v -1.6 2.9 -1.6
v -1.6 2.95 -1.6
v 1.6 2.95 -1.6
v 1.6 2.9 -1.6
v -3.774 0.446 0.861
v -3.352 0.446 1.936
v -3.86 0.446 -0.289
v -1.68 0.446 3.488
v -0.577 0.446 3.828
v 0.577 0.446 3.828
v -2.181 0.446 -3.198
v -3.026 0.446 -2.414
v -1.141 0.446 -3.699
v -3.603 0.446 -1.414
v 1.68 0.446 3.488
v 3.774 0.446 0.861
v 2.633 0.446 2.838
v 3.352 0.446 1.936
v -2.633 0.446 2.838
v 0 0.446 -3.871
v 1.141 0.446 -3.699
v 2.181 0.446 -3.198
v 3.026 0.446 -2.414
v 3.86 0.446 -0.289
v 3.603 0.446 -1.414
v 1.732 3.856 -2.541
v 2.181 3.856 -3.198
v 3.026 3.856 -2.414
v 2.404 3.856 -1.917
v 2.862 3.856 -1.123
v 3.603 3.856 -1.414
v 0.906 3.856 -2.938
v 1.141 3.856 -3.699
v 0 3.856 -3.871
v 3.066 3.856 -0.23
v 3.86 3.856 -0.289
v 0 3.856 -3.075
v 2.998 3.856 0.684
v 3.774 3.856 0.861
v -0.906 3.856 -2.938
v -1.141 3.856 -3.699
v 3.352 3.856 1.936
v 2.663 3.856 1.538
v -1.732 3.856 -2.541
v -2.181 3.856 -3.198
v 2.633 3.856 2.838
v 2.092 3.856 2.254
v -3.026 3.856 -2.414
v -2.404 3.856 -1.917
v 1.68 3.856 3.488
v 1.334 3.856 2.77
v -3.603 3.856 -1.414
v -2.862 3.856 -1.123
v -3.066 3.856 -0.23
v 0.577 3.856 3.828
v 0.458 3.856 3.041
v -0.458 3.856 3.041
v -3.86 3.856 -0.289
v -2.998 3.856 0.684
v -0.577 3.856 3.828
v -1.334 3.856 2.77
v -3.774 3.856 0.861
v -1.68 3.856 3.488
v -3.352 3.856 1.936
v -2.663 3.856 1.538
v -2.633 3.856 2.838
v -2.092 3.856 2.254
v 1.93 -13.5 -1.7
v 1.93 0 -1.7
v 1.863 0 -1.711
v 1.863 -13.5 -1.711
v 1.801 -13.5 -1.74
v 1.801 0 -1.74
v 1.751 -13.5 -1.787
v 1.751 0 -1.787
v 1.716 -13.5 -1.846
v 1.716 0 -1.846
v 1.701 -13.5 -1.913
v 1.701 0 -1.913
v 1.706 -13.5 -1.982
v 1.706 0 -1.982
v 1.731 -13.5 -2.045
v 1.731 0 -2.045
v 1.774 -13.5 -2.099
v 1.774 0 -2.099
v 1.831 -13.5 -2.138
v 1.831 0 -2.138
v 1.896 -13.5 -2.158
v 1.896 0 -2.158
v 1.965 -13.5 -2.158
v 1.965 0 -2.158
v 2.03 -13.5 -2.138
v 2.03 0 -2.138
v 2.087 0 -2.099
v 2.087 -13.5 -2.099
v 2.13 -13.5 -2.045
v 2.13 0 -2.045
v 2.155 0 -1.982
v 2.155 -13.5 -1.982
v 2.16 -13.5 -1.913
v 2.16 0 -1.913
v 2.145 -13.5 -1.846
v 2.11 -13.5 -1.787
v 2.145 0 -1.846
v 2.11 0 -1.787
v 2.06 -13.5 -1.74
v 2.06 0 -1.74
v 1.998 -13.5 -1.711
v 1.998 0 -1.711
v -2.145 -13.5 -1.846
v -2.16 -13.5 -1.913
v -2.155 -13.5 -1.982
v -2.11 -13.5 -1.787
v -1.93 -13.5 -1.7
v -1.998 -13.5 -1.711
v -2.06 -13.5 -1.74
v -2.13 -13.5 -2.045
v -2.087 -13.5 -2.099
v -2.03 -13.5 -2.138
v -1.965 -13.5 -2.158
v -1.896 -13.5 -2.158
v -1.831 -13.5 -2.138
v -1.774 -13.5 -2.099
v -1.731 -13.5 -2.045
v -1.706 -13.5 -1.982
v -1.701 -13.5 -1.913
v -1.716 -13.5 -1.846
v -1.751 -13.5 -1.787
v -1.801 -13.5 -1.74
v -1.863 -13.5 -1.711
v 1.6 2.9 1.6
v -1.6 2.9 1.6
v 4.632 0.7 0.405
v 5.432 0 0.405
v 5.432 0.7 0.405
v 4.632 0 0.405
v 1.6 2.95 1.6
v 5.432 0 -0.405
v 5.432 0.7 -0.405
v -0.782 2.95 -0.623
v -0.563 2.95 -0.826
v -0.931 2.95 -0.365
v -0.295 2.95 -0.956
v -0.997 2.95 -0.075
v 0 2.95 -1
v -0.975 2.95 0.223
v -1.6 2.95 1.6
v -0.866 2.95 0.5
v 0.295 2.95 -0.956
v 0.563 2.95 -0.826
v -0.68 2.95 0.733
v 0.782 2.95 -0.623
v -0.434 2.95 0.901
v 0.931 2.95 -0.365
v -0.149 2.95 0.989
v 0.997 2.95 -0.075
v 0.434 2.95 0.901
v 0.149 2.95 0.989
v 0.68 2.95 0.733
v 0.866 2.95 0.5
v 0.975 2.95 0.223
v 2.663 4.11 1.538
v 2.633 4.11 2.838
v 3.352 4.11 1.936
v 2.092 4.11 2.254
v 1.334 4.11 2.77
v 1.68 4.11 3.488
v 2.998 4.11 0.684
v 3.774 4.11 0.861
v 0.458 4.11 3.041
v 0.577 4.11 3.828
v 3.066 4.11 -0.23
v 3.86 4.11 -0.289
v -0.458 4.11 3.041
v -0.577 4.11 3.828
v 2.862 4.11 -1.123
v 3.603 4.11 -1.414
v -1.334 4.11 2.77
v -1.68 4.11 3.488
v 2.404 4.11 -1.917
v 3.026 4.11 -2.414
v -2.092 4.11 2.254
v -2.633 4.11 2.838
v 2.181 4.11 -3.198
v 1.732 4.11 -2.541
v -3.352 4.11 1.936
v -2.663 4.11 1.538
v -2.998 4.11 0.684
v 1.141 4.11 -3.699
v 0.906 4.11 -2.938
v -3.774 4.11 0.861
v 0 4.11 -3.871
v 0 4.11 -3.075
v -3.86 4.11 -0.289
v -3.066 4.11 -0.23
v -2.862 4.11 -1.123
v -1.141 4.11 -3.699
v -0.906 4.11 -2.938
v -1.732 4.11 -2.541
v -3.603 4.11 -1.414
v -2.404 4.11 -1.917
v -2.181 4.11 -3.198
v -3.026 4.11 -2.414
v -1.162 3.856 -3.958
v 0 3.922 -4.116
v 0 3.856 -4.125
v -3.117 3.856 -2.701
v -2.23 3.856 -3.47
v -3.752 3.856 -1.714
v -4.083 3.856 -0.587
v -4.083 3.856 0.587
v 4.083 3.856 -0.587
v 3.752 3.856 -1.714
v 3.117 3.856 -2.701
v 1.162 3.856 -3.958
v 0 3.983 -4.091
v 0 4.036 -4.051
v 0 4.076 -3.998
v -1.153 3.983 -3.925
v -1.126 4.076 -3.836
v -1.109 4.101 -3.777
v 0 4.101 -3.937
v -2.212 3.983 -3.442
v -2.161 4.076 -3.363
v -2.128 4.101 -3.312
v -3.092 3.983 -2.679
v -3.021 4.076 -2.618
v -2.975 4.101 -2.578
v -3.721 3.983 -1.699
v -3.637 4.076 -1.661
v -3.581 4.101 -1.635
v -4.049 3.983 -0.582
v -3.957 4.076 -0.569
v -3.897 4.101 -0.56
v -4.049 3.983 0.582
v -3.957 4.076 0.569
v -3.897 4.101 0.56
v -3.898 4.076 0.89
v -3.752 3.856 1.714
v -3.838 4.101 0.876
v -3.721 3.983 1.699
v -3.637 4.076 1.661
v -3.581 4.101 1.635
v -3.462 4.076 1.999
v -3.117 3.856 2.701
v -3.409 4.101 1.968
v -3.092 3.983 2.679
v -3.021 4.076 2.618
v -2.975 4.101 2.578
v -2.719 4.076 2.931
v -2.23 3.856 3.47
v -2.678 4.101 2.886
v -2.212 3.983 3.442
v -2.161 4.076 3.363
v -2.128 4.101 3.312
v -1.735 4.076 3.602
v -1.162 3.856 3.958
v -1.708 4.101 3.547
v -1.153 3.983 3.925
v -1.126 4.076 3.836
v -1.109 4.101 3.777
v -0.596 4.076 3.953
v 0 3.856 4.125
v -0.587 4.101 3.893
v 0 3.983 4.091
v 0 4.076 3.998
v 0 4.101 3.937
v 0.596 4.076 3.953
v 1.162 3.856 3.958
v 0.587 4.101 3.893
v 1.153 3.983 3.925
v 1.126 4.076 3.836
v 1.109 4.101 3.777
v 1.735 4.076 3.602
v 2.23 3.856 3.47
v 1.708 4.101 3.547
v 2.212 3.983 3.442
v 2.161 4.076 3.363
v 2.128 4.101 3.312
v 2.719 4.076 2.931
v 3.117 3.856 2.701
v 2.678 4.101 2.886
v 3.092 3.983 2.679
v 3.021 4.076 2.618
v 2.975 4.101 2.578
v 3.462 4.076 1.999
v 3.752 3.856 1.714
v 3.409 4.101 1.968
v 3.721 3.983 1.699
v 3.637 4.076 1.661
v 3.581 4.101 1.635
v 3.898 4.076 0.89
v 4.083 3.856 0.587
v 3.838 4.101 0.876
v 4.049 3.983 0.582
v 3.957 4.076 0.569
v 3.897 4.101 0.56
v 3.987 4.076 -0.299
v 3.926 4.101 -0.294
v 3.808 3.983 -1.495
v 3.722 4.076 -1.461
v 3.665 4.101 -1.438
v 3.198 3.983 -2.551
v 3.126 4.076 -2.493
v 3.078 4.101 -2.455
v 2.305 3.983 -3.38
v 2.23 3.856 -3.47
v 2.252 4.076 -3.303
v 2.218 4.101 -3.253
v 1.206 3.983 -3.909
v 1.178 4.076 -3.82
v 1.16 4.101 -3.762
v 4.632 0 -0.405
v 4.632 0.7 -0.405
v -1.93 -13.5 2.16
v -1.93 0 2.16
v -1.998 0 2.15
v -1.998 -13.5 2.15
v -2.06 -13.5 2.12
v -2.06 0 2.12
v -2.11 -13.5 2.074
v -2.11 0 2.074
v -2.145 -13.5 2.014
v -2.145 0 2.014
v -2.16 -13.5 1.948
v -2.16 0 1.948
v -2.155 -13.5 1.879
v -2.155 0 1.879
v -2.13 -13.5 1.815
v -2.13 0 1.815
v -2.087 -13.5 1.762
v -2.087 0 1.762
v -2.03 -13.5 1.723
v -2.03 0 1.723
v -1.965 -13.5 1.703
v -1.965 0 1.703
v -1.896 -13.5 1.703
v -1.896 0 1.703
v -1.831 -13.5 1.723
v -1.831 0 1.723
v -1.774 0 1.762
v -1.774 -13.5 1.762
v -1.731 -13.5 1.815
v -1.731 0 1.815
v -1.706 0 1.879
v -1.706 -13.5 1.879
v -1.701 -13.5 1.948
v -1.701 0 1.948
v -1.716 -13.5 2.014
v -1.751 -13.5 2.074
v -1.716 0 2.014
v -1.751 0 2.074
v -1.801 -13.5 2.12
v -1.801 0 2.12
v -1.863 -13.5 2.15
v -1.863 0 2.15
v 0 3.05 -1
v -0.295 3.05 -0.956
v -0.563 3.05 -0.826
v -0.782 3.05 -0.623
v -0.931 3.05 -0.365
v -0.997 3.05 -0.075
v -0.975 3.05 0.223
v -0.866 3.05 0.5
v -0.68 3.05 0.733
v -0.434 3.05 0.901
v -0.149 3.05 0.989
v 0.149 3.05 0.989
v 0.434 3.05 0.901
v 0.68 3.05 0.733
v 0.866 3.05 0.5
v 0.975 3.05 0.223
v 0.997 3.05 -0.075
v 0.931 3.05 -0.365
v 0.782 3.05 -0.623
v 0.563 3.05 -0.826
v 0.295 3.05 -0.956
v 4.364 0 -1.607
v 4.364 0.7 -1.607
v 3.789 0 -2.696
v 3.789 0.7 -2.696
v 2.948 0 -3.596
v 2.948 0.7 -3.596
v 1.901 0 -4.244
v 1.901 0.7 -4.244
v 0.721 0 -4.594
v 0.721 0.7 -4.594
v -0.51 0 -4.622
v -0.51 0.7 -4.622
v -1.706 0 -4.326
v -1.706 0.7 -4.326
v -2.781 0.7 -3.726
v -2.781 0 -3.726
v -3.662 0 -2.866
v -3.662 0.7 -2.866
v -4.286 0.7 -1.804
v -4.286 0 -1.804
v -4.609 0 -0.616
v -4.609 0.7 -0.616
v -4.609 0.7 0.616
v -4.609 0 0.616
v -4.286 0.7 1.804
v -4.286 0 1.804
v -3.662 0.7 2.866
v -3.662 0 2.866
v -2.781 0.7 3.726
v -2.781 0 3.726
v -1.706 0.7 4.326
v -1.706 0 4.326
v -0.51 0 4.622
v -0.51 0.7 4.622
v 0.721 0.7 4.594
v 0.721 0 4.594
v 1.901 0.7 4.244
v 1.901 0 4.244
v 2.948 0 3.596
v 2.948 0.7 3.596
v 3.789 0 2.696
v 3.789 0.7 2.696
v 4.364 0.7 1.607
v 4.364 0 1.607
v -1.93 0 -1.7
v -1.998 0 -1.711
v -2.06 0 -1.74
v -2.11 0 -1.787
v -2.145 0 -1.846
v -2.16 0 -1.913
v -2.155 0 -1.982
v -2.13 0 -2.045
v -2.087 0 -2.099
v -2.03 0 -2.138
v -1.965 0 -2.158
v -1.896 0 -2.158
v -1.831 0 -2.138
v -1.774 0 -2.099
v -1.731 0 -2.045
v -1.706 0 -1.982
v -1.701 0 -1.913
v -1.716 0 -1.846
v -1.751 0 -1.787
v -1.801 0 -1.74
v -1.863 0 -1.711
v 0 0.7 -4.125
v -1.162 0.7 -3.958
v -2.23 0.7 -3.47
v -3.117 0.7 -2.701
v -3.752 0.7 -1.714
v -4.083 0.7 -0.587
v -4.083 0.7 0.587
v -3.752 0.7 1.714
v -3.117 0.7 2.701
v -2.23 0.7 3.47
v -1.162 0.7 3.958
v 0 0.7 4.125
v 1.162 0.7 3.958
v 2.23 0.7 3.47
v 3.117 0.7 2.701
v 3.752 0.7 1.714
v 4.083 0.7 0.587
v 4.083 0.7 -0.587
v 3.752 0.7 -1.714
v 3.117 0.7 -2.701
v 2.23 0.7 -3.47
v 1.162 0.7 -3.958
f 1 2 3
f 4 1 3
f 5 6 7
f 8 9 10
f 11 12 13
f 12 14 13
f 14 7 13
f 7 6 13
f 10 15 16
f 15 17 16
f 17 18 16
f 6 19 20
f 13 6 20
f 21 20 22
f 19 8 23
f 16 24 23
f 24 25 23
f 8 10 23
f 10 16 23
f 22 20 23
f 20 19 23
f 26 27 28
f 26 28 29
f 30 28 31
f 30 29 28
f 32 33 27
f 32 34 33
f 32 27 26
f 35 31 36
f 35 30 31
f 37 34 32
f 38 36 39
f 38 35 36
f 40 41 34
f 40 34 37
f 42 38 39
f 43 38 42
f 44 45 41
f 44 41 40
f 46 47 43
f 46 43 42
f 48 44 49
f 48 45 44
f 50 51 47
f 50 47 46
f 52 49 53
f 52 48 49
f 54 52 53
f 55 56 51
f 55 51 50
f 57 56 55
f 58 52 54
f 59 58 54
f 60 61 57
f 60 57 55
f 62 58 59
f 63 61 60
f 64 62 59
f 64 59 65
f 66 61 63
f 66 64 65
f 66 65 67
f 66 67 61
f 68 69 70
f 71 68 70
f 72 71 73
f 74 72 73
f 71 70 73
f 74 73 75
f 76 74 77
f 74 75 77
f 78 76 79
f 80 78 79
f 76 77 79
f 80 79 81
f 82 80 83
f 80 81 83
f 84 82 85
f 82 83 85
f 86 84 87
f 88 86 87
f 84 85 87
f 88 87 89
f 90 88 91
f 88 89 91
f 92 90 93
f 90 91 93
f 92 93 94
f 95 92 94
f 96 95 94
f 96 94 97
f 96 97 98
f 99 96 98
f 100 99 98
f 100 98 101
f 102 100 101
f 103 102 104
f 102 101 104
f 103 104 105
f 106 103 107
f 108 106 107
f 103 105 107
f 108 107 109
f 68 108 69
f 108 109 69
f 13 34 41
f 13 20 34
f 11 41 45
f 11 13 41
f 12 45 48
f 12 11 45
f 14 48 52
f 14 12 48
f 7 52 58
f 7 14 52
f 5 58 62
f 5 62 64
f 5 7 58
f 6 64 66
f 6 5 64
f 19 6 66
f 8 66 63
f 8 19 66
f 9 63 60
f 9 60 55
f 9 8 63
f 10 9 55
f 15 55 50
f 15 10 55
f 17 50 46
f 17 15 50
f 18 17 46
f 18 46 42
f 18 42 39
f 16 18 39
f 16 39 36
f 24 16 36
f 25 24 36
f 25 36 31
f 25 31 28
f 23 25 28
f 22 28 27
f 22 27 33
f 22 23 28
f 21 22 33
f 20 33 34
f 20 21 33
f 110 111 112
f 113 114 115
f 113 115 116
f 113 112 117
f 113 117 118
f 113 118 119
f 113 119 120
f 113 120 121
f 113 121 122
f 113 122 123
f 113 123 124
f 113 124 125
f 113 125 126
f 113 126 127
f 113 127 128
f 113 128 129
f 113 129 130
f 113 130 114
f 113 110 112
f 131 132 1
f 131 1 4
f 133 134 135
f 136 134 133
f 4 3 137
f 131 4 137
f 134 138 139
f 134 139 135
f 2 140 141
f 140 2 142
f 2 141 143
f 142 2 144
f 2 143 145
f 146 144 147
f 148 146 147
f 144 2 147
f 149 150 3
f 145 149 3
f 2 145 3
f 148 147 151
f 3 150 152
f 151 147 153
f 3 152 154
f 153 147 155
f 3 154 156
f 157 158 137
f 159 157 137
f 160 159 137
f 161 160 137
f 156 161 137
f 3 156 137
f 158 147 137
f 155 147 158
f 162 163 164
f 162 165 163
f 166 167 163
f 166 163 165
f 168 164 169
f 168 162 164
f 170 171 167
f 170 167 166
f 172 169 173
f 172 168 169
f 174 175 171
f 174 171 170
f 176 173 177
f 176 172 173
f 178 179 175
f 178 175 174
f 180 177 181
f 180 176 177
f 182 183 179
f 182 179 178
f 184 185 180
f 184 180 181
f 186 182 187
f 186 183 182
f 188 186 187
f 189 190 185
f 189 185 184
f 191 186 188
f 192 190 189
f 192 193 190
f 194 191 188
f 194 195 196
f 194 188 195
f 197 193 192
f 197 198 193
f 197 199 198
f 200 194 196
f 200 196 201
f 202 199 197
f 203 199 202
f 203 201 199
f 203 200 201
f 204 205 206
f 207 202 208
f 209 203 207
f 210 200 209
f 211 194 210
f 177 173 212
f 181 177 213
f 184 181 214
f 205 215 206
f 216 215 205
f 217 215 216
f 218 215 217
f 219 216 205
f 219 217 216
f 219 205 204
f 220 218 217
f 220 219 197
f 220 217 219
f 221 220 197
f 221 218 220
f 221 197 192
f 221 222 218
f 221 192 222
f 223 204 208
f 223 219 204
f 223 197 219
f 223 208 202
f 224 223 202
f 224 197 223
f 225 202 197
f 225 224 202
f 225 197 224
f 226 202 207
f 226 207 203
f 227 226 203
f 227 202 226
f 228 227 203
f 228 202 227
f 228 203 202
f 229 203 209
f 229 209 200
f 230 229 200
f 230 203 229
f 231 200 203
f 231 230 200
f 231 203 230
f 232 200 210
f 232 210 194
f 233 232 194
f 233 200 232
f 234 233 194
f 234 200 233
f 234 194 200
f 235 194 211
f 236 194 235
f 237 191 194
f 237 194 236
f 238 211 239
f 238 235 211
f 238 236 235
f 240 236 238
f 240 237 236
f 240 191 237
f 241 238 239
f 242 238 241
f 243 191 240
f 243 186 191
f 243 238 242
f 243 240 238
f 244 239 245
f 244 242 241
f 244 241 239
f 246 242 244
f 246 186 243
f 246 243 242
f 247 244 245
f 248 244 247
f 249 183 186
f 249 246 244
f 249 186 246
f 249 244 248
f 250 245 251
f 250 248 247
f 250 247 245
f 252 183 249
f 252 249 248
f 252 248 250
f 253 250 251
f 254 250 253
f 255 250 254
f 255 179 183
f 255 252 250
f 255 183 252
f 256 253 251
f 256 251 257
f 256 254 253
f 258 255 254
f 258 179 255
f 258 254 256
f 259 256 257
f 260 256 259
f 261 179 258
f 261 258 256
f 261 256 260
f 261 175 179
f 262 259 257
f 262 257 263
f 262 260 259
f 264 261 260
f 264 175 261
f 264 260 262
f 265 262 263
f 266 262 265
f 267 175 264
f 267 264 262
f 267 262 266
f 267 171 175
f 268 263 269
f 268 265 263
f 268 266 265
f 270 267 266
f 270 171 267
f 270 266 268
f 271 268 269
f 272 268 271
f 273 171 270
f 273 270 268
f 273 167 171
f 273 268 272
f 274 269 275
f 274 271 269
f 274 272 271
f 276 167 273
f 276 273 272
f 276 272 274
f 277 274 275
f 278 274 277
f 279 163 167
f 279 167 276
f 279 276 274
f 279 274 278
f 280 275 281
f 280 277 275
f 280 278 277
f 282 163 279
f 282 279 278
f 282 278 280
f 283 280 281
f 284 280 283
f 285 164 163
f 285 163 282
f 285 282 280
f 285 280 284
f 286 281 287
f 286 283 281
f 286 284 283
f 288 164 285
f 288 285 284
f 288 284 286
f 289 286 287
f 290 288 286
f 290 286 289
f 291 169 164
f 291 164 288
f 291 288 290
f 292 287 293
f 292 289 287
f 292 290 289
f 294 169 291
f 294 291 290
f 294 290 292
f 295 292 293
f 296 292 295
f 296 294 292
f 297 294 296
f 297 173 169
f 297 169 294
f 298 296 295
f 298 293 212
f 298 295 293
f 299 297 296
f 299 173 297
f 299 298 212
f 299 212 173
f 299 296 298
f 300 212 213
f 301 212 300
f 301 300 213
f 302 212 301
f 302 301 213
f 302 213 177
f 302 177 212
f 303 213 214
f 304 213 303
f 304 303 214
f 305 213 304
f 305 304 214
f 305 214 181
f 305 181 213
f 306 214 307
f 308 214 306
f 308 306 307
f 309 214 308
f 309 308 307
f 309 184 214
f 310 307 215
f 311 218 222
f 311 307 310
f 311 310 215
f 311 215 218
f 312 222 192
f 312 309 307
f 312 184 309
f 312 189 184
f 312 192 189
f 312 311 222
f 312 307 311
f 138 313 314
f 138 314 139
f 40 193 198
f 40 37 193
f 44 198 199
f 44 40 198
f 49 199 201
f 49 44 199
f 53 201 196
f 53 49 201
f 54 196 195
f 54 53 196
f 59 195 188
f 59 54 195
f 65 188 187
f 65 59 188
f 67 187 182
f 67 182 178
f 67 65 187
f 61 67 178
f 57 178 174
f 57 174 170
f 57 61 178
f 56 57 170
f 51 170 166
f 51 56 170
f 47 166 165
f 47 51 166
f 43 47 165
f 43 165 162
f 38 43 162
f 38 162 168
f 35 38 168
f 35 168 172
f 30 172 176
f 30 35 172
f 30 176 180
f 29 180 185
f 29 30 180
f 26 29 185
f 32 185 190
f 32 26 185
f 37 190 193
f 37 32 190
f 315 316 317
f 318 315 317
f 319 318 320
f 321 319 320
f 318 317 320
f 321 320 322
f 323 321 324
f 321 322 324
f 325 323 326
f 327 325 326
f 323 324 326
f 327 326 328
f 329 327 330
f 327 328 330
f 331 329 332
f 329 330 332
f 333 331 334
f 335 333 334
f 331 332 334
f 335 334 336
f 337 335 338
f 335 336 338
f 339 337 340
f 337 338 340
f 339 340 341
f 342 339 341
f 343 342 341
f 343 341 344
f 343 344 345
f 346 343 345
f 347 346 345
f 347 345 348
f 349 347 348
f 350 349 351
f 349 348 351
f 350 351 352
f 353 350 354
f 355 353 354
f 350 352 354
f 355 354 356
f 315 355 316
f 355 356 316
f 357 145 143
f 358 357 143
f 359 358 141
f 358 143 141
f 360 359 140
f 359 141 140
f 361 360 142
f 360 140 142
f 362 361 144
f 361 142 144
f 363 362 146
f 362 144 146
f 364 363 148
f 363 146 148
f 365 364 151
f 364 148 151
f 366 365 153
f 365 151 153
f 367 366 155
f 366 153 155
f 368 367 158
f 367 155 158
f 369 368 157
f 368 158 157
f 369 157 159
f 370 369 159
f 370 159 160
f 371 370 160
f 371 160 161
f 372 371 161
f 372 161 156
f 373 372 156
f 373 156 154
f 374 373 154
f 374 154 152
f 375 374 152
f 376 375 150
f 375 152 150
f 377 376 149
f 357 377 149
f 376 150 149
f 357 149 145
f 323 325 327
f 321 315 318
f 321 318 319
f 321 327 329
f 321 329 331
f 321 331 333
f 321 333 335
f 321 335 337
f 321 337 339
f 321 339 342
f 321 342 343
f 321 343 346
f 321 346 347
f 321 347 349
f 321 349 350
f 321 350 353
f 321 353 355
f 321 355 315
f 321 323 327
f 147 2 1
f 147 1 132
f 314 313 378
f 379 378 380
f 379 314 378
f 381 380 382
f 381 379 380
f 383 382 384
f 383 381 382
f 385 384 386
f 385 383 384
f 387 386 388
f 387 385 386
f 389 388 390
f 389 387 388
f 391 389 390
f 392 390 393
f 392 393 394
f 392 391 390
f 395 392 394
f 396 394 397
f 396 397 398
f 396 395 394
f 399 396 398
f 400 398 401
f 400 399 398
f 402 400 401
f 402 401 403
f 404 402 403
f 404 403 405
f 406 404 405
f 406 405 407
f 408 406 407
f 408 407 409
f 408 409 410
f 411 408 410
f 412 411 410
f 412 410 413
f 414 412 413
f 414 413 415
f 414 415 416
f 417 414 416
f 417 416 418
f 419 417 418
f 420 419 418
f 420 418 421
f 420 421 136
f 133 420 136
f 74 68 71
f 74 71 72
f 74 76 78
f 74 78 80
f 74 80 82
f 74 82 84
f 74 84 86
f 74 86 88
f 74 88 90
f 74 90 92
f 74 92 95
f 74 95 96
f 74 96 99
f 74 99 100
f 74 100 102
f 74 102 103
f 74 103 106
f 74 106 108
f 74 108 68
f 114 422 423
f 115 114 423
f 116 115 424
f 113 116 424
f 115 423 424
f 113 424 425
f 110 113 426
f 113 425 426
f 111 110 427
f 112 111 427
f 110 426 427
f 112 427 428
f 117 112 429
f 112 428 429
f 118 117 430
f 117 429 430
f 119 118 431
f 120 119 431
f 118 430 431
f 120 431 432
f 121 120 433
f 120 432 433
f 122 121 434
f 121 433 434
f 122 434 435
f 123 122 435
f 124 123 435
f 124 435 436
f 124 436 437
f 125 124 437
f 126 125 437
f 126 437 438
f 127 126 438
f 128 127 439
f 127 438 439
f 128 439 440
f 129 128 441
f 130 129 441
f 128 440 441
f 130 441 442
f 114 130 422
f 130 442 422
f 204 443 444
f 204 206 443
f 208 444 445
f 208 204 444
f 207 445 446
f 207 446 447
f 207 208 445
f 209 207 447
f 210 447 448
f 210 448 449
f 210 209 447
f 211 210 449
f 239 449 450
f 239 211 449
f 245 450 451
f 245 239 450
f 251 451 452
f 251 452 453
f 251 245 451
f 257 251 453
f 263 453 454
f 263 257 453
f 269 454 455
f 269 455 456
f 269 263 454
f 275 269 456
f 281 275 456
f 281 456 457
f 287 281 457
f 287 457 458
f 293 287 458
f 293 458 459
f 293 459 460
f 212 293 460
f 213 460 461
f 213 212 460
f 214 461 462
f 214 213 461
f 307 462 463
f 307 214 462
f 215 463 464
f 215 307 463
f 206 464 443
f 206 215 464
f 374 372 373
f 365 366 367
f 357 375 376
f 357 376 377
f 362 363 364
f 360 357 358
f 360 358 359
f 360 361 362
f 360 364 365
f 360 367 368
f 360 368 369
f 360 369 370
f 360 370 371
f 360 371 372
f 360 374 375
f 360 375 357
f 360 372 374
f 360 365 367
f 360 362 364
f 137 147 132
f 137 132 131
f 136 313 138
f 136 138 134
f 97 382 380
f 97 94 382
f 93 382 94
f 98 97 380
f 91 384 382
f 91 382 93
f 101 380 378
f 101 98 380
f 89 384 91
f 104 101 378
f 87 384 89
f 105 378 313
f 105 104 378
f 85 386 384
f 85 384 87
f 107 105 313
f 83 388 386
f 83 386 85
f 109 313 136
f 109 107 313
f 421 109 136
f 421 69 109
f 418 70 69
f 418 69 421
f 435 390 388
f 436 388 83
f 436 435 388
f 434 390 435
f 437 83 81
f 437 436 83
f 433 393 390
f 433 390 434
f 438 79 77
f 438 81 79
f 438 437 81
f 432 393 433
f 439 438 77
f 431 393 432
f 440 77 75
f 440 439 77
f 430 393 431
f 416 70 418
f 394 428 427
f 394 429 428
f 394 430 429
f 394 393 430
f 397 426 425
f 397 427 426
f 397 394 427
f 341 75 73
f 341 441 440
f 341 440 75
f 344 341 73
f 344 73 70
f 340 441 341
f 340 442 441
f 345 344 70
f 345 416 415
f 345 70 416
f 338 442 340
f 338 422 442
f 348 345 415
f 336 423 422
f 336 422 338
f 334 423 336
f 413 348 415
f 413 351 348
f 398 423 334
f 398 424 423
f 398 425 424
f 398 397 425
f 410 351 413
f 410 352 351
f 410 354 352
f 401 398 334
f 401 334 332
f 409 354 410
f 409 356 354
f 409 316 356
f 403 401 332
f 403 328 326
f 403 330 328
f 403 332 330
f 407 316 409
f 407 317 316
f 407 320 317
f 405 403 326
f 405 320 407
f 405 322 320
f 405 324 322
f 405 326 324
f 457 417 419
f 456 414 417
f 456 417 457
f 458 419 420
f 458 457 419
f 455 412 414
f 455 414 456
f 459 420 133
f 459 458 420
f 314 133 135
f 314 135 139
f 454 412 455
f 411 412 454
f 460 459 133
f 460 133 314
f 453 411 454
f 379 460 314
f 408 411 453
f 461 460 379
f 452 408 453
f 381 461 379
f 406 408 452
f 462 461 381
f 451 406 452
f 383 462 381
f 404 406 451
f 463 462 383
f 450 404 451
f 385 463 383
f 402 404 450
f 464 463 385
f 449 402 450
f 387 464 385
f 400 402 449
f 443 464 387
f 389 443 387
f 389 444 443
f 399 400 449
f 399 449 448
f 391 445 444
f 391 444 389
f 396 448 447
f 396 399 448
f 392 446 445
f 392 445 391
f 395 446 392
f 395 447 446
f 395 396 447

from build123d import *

# Parameters (mm, degrees)
SKETCH2_R           = 4.65
BOSS_EXTRUDE1_DEPTH = 0.446
BOSS_EXTRUDE2_START = -2.95
SKETCH3_W           = 3.2
SKETCH3_H           = 3.2
BOSS_EXTRUDE2_DEPTH = 0.05
SKETCH8_R           = 1
BOSS_EXTRUDE6_DEPTH = 0.1
BOSS_EXTRUDE8_DEPTH = 0.7
SKETCH5_R           = 0.23
BOSS_EXTRUDE4_DEPTH = 13.5


with BuildPart() as part:
    # Sketch1 → Revolve-Thin2 (revolve)
    with BuildSketch(Plane.XY, mode=Mode.PRIVATE) as revolve_thin2_sk:
        with BuildLine():
            Line((4.65, 0), (4.65, 0.7))
            Line((4.65, 0.7), (4.125, 0.7))
            Line((4.125, 0.7), (4.125, 3.856))
            ThreePointArc((4.125, 3.856), (4.050605122, 4.035605122), (3.871, 4.11))
            Line((3.871, 4.11), (3.075, 4.11))
            Line((3.075, 4.11), (3.075, 3.856))
            Line((3.075, 3.856), (3.871, 3.856))
            Line((3.871, 3.856), (3.871, 0.446))
            Line((3.871, 0.446), (4.396, 0.446))
            Line((4.396, 0.446), (4.396, 0))
            Line((4.396, 0), (4.65, 0))
        make_face()
    revolve(revolve_thin2_sk.sketch.rotate(Axis((0, 0, 0), (0, 1, 0)), 90), axis=Axis((0, 0, 0), (0, 1, 0)))  # turned: the seam where the file's is

    # Sketch2 → Boss-Extrude1 (add)
    with BuildSketch(Plane.XZ):
        with Locations(Location((0, 0, 0), (0, 0, 270))):  # turned: the seam where the file's is
            Circle(SKETCH2_R)
    extrude(amount=-BOSS_EXTRUDE1_DEPTH)

    # Sketch11 → Boss-Extrude8 (add)
    with BuildSketch(Plane.XZ):
        with BuildLine():
            Line((5.432329328, -0.405), (5.432329328, 0))
            Line((5.432329328, 0), (5.432329328, 0.405))
            Line((5.432329328, 0.405), (4.632329328, 0.405))
            ThreePointArc((4.632329328, 0.405), (4.645580231, 0.202692657), (4.65, 0))
            ThreePointArc((4.65, 0), (4.645580231, -0.202692657), (4.632329328, -0.405))
            Line((4.632329328, -0.405), (5.432329328, -0.405))
        make_face()
    extrude(amount=-BOSS_EXTRUDE8_DEPTH)

    # Sketch5 → Boss-Extrude4 (add)
    with BuildSketch(Plane.XZ):
        with Locations(Location((1.930401513, -1.930401513, 0), (0, 0, 90))):  # turned: the seam where the file's is
            Circle(SKETCH5_R)
        with Locations(Location((-1.930401513, 1.930401513, 0), (0, 0, 90))):  # turned: the seam where the file's is
            Circle(SKETCH5_R)
        with Locations(Location((-1.930401513, -1.930401513, 0), (0, 0, 90))):  # turned: the seam where the file's is
            Circle(SKETCH5_R)
    extrude(amount=BOSS_EXTRUDE4_DEPTH)


with BuildPart() as body_2:
    # Sketch3 → Boss-Extrude2 (new body)
    with BuildSketch(Plane.XZ.offset(BOSS_EXTRUDE2_START)):
        Rectangle(SKETCH3_W, SKETCH3_H)
    extrude(amount=BOSS_EXTRUDE2_DEPTH)

    # Sketch8 → Boss-Extrude6 (add)
    with BuildSketch(Plane(origin=(0, 2.95, 0), x_dir=(-1, 0, 0), z_dir=(0, 1, 0))):
        with Locations(Location((0, 0, 0), (0, 0, 270))):  # turned: the seam where the file's is
            Circle(SKETCH8_R)
    extrude(amount=BOSS_EXTRUDE6_DEPTH)


solid = Compound([part.part, body_2.part])
